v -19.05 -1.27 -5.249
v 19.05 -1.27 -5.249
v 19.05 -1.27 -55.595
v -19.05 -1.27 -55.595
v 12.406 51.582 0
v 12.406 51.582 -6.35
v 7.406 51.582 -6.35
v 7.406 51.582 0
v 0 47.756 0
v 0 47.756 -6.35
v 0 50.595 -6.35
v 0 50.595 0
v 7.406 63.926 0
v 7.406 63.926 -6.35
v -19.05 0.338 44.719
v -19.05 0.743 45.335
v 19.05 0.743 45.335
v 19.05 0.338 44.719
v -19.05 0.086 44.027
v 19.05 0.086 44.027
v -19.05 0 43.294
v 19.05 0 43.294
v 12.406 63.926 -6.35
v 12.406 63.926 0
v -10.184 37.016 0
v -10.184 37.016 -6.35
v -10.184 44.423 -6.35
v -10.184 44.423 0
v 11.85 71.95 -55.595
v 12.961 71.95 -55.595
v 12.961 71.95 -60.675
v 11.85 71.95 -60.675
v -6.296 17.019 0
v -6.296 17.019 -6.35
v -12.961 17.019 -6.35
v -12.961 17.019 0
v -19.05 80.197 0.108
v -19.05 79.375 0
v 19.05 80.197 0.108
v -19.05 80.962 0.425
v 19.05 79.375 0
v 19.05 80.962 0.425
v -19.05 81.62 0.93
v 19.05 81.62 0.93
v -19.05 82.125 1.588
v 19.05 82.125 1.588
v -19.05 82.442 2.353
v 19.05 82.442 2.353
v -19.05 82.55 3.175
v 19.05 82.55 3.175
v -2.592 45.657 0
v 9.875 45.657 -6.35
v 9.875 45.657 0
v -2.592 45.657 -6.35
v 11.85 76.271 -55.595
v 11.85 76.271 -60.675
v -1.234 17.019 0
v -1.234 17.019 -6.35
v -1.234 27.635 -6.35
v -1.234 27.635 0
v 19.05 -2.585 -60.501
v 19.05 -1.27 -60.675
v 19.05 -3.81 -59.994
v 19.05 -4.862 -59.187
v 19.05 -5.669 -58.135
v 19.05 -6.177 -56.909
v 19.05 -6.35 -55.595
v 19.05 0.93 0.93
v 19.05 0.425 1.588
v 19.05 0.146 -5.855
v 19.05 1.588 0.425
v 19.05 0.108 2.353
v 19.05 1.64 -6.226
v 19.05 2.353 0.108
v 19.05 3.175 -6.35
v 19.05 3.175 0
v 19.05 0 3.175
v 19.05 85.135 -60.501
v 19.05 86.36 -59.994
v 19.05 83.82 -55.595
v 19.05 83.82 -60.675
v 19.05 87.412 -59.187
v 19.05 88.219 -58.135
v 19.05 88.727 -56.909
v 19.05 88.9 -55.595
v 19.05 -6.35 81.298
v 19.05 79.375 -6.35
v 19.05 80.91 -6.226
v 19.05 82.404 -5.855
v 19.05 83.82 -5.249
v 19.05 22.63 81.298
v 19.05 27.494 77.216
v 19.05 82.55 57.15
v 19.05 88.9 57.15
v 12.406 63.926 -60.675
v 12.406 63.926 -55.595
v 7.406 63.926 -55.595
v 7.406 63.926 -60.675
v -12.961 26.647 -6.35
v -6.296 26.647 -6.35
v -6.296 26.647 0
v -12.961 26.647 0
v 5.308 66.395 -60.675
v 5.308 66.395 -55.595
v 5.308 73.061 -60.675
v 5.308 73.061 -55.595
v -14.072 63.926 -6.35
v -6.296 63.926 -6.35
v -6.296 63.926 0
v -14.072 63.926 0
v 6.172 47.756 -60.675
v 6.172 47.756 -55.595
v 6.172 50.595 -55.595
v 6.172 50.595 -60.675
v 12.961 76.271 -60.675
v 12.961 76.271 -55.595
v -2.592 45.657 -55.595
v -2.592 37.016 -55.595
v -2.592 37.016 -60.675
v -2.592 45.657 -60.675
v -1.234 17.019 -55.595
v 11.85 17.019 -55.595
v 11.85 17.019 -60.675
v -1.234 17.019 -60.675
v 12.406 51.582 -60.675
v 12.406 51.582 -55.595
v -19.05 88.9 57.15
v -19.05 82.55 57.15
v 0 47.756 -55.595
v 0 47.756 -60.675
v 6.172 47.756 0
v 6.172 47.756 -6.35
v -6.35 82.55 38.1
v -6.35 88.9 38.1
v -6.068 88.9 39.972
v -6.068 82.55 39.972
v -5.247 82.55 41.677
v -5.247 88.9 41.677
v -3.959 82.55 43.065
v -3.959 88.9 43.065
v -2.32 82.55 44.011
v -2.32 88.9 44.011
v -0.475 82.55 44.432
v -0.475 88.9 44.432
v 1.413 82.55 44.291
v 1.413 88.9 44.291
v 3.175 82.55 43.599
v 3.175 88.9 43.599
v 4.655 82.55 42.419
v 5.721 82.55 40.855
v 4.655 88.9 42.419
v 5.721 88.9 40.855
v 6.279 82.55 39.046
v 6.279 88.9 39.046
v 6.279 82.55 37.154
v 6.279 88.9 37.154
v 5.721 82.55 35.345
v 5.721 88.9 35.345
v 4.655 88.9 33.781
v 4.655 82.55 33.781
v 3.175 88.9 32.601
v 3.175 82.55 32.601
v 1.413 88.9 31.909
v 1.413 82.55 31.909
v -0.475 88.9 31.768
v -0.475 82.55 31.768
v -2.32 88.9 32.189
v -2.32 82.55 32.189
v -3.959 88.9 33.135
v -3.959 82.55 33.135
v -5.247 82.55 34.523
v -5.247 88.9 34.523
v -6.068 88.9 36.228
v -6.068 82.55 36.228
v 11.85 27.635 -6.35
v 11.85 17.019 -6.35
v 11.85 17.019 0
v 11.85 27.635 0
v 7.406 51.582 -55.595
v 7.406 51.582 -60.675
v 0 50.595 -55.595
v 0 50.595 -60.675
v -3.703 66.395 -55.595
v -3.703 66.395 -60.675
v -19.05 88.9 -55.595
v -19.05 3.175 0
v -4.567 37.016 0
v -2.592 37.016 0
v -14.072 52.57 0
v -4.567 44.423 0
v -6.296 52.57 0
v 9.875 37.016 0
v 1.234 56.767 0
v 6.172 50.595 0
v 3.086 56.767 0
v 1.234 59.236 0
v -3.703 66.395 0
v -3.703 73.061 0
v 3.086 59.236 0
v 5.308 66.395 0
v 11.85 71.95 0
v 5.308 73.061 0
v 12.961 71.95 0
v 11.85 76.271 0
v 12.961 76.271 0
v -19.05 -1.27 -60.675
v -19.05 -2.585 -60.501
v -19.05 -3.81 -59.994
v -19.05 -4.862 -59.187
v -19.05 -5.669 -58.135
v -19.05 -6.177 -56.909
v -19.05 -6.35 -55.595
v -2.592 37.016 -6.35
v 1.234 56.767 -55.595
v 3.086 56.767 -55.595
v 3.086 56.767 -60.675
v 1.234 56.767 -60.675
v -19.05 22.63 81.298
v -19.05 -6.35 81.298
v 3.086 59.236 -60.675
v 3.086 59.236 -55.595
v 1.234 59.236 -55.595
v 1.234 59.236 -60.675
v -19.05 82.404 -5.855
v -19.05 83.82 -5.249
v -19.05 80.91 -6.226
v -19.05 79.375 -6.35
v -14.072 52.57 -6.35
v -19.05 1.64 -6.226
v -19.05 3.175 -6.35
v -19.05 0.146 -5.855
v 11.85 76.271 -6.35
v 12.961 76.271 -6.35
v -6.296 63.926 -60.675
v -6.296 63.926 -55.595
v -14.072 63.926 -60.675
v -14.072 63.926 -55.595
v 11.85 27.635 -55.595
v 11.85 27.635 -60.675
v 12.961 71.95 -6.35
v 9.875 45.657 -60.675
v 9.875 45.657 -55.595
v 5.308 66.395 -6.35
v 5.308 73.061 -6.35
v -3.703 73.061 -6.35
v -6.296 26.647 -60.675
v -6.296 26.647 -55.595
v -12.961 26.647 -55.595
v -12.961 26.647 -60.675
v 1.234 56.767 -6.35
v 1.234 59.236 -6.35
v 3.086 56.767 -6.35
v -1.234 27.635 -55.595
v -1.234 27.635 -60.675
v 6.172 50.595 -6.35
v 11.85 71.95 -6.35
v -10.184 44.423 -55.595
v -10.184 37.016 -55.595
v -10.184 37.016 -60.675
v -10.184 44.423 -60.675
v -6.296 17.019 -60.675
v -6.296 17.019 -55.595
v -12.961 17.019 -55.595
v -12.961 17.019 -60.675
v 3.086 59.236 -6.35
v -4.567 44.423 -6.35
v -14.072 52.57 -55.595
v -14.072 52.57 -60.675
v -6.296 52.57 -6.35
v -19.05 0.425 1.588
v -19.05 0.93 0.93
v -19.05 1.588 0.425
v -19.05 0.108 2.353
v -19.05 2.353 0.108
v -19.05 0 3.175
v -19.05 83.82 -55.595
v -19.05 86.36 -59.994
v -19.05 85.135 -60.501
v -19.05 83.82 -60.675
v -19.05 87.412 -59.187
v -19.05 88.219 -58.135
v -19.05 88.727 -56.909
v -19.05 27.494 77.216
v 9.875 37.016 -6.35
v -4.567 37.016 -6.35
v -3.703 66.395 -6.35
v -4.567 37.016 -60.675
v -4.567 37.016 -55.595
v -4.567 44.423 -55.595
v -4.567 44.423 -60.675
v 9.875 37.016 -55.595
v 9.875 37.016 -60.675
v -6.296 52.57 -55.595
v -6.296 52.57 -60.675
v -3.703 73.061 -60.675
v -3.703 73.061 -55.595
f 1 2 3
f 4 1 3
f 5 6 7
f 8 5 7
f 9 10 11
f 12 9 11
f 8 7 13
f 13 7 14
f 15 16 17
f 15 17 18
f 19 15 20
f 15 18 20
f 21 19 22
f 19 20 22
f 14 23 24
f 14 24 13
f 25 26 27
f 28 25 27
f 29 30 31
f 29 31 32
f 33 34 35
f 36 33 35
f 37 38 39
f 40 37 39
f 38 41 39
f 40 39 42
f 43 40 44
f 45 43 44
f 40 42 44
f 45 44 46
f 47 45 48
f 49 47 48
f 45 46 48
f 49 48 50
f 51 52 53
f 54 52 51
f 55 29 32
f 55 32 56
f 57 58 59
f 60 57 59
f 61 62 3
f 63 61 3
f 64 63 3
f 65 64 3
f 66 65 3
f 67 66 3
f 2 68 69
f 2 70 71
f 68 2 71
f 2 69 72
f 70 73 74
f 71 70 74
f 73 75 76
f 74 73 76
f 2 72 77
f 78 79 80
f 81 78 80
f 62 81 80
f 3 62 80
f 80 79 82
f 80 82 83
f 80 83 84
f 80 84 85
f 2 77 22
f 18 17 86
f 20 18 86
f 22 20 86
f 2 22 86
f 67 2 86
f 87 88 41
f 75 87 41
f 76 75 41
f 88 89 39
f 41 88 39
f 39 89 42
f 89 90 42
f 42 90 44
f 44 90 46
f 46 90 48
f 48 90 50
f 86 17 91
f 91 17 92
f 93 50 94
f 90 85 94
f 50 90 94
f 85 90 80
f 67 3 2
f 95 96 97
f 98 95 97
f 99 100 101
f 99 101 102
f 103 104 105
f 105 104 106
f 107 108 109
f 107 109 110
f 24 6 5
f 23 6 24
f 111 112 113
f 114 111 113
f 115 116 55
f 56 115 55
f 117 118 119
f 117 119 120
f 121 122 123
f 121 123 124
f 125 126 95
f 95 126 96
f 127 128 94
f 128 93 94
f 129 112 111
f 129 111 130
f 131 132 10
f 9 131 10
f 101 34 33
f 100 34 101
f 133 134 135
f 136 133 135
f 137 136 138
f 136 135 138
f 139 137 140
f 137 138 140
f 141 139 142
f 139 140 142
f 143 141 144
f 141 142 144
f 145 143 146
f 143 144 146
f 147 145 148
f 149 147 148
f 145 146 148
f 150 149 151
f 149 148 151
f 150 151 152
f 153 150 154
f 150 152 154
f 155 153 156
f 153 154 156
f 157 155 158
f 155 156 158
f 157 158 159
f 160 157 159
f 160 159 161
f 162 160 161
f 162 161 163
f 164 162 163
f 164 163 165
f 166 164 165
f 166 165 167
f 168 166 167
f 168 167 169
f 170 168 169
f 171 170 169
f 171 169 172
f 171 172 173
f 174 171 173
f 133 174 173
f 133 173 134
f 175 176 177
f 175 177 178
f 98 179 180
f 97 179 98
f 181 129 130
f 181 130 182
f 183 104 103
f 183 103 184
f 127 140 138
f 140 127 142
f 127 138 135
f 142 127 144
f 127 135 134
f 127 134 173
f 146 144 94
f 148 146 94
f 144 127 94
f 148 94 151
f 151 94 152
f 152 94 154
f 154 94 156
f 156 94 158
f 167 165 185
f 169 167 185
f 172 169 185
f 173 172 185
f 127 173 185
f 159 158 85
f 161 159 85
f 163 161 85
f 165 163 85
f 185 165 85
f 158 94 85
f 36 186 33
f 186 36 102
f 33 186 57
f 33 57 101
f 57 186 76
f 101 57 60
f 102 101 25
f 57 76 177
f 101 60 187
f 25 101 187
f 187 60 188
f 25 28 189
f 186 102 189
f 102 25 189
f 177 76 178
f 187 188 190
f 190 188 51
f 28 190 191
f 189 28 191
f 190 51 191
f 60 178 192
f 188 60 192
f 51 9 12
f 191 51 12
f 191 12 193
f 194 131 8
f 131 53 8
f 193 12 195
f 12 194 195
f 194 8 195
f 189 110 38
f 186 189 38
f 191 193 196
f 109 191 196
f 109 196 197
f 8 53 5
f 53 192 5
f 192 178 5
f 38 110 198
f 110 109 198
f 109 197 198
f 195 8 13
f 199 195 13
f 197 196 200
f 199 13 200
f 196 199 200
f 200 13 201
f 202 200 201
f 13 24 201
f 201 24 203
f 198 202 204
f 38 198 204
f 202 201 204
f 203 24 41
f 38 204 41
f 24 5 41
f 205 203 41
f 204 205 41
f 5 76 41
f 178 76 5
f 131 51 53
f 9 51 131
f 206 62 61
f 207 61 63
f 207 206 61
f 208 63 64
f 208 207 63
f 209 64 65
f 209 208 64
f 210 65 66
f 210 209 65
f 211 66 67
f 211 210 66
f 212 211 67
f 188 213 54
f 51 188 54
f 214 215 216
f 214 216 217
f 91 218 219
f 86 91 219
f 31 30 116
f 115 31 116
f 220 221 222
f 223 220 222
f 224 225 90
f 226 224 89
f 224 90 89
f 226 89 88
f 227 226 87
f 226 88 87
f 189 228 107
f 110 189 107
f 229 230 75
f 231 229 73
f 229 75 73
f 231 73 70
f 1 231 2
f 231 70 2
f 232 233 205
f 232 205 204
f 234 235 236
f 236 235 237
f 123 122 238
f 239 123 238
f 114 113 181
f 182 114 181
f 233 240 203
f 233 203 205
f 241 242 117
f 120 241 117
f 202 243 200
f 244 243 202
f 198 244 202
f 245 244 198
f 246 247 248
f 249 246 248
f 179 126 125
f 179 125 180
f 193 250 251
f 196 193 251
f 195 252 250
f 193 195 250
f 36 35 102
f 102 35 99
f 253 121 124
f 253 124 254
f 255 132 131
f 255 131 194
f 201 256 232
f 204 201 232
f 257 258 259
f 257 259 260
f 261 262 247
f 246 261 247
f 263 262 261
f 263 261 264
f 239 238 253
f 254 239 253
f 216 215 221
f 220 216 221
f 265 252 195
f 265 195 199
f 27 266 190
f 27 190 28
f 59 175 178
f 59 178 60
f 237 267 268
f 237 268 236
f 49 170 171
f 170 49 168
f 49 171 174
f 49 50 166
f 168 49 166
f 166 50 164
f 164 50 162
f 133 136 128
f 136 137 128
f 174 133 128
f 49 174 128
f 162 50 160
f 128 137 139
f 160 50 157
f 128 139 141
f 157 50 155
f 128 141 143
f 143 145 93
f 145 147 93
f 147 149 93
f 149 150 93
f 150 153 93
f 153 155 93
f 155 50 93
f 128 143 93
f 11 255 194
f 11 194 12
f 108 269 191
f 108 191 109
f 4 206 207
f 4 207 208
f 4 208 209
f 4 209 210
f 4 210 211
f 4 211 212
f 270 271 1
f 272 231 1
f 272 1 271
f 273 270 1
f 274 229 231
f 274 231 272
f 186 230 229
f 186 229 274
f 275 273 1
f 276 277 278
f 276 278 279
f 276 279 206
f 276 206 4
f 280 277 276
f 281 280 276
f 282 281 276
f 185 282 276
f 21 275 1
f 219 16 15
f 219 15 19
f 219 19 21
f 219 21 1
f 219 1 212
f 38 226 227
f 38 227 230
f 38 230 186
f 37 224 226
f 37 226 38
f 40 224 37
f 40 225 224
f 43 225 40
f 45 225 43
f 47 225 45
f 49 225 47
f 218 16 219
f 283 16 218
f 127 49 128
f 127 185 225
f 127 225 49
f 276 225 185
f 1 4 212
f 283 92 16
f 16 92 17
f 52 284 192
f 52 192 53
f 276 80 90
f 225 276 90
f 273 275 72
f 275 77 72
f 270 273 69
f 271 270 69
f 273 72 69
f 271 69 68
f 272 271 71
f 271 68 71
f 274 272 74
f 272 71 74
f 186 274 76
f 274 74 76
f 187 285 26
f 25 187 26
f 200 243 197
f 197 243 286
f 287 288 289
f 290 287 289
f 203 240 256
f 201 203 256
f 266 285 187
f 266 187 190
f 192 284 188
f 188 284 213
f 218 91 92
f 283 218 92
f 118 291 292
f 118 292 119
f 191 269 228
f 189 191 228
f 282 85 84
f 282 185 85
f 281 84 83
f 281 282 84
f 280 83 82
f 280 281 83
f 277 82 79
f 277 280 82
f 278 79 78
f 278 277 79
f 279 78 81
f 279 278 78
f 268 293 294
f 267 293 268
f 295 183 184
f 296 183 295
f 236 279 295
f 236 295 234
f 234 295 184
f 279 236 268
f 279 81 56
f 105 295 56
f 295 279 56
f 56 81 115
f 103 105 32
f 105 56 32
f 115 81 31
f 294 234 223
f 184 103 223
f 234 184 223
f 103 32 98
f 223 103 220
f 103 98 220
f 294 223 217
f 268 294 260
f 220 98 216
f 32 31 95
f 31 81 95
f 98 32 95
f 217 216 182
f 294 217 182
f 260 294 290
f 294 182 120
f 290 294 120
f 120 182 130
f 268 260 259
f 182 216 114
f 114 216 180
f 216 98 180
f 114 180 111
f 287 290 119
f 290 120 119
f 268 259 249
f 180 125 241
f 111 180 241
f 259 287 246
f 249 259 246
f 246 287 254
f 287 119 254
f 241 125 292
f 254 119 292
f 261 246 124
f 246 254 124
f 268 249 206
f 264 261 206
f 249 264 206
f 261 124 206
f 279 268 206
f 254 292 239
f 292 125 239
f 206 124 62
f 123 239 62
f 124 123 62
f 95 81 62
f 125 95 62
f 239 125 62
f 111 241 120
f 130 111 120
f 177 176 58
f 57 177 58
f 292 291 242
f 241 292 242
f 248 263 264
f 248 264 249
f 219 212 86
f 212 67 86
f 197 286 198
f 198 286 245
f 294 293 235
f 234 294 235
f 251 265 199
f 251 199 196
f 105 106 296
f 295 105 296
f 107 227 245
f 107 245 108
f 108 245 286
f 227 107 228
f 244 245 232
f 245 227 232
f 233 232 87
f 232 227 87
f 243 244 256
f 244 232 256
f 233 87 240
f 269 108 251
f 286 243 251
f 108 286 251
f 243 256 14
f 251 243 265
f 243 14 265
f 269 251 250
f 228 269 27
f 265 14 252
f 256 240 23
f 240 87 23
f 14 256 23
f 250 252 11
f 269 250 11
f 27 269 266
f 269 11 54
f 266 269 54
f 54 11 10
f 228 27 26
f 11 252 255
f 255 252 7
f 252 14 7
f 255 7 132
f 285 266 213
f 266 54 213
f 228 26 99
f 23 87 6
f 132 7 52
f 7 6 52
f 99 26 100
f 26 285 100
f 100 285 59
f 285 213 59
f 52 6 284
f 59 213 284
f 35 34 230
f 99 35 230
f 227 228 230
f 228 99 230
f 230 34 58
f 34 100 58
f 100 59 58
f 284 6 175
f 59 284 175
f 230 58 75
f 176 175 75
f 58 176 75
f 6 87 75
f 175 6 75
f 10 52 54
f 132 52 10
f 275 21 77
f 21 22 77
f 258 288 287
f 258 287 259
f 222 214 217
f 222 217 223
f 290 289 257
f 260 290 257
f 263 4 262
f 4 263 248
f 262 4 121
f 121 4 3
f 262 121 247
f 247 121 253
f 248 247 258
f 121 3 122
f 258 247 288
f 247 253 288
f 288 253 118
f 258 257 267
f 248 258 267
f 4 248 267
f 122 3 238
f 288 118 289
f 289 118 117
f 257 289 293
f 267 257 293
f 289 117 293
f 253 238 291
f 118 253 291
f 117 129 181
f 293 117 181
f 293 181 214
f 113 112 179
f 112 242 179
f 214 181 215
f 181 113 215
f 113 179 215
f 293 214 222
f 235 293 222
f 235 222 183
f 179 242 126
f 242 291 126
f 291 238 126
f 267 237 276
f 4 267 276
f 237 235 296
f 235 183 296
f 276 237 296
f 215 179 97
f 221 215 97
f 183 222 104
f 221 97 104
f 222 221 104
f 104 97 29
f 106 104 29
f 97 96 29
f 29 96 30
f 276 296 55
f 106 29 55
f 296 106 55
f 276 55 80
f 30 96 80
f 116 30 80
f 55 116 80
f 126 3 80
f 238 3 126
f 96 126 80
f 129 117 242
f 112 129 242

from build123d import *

# Parameters (mm, degrees)
BASE_EXTRUDE_THIN_DEPTH        = 19.05
CUT_EXTRUDE1_REACH             = 97.25
SKETCH2_R                      = 6.35
BOSS_EXTRUDE1_START            = -19.05
BOSS_EXTRUDE1_DEPTH            = 38.1
EXTRUDE_THIN1_DEPTH            = 38.1
CUT_EXTRUDE2_REACH             = 89.648
SKETCH4_W                      = 1.110971389
SKETCH4_H                      = 4.320444291
SKETCH4_W_2                    = 1.851618982
SKETCH4_H_2                    = 2.46882531
SKETCH4_W_3                    = 12.467567812
SKETCH4_H_3                    = 8.640888583
SKETCH4_W_4                    = 7.776799724
SKETCH4_H_4                    = 11.356596423
SKETCH4_W_5                    = 13.08477414
SKETCH4_H_5                    = 10.61594883
SKETCH4_W_6                    = 6.665828335
SKETCH4_H_6                    = 9.628418706
SKETCH4_W_7                    = 5.616577579
SKETCH4_H_7                    = 7.406475928
SKETCH4_W_8                    = 9.011212379
SKETCH4_H_8                    = 6.665828335
SKETCH4_W_9                    = 6.172063273
SKETCH4_H_9                    = 2.839149106
SKETCH4_W_10                   = 4.999371251
SKETCH4_H_10                   = 12.344126546
CUT_EXTRUDE2_DIRECTION_2_DEPTH = 55.324508946
FILLET1_R                      = 5.08


with BuildPart() as part:
    # Sketch1 → Base-Extrude-Thin (new body, symmetric)
    with BuildSketch(Plane(origin=(0, 0, 0), x_dir=(0, 0, -1), z_dir=(1, 0, 0))):
        with BuildLine():
            Line((-77.216478592, 27.494340102), (-45.335245167, 0.742808893))
            ThreePointArc((-45.335245167, 0.742808893), (-44.380308461, 0.191475929), (-43.294394506, 0))
            Line((-43.294394506, 0), (-3.175, 0))
            ThreePointArc((-3.175, 0), (-0.92993597, 0.92993597), (0, 3.175))
            Line((0, 3.175), (0, 79.375))
            ThreePointArc((0, 79.375), (-0.92993597, 81.62006403), (-3.175, 82.55))
            Line((-3.175, 82.55), (-57.15, 82.55))
            Line((-57.15, 82.55), (-57.15, 88.9))
            Line((-57.15, 88.9), (-3.175, 88.9))
            ThreePointArc((-3.175, 88.9), (3.560192091, 86.110192091), (6.35, 79.375))
            Line((6.35, 79.375), (6.35, 3.175))
            ThreePointArc((6.35, 3.175), (3.560192091, -3.560192091), (-3.175, -6.35))
            Line((-3.175, -6.35), (-43.294394506, -6.35))
            ThreePointArc((-43.294394506, -6.35), (-46.552136371, -5.775572213), (-49.416946488, -4.121573321))
            Line((-49.416946488, -4.121573321), (-81.298179914, 22.629957888))
            Line((-81.298179914, 22.629957888), (-77.216478592, 27.494340102))
        make_face()
    extrude(amount=BASE_EXTRUDE_THIN_DEPTH, both=True)

    # Sketch2 → Cut-Extrude1 (cut, up to next)
    with BuildSketch(Plane(origin=(0, 88.9, 0), x_dir=(-1, 0, 0), z_dir=(0, 1, 0)), mode=Mode.PRIVATE) as cut_extrude1_sk1:
        with Locations((0, 38.1)):
            Circle(SKETCH2_R)
    cut_extrude1_tool1 = extrude(cut_extrude1_sk1.sketch, amount=-CUT_EXTRUDE1_REACH, mode=Mode.PRIVATE) & part.part
    add(cut_extrude1_tool1.solids().sort_by_distance((0, 88.9, 38.1))[0], mode=Mode.SUBTRACT)

    # Sketch3 → Boss-Extrude1 (add)
    with BuildSketch(Plane(origin=(0, 0, 0), x_dir=(0, 0, -1), z_dir=(1, 0, 0)).offset(BOSS_EXTRUDE1_START)):
        with BuildLine():
            Line((-49.416946488, -4.121573321), (-81.298179914, 22.629957888))
            Line((-81.298179914, 22.629957888), (-81.298179914, -6.35))
            Line((-81.298179914, -6.35), (-43.294394506, -6.35))
            ThreePointArc((-43.294394506, -6.35), (-46.552136371, -5.775572213), (-49.416946488, -4.121573321))
        make_face()
    extrude(amount=BOSS_EXTRUDE1_DEPTH)

    # Sketch5 → Extrude-Thin1 (add, through all)
    with BuildSketch(Plane(origin=(19.05, 0, 0), x_dir=(0, 0, -1), z_dir=(1, 0, 0))):
        Polygon((-3.175, 88.9), (60.674508946, 88.9), (60.674508946, -6.35), (-3.175, -6.35), (-3.175, -1.27), (55.594508946, -1.27), (55.594508946, 83.82), (-3.175, 83.82), align=None)
    extrude(amount=-EXTRUDE_THIN1_DEPTH)

    # Sketch4 → Cut-Extrude2 (cut, up to next)
    with BuildSketch(Plane(origin=(0, 0, -6.35), x_dir=(-1, 0, 0), z_dir=(0, 0, -1)), mode=Mode.PRIVATE) as cut_extrude2_sk1:
        with Locations((-12.40584718, 74.110376614)):
            Rectangle(SKETCH4_W, SKETCH4_H)
    cut_extrude2_tool1 = extrude(cut_extrude2_sk1.sketch, amount=-CUT_EXTRUDE2_REACH, mode=Mode.PRIVATE) & part.part
    add(cut_extrude2_tool1.solids().sort_by_distance((12.405847, 74.110377, -6.35))[0], mode=Mode.SUBTRACT)
    # Sketch4 → Cut-Extrude2 (cut, up to next)
    with BuildSketch(Plane(origin=(0, 0, -6.35), x_dir=(-1, 0, 0), z_dir=(0, 0, -1)), mode=Mode.PRIVATE) as cut_extrude2_sk2:
        with Locations((-2.160222146, 58.001291471)):
            Rectangle(SKETCH4_W_2, SKETCH4_H_2)
    cut_extrude2_tool2 = extrude(cut_extrude2_sk2.sketch, amount=-CUT_EXTRUDE2_REACH, mode=Mode.PRIVATE) & part.part
    add(cut_extrude2_tool2.solids().sort_by_distance((2.160222, 58.001291, -6.35))[0], mode=Mode.SUBTRACT)
    # Sketch4 → Cut-Extrude2 (cut, up to next)
    with BuildSketch(Plane(origin=(0, 0, -6.35), x_dir=(-1, 0, 0), z_dir=(0, 0, -1)), mode=Mode.PRIVATE) as cut_extrude2_sk3:
        with Locations((-3.641517331, 41.336720633)):
            Rectangle(SKETCH4_W_3, SKETCH4_H_3)
    cut_extrude2_tool3 = extrude(cut_extrude2_sk3.sketch, amount=-CUT_EXTRUDE2_REACH, mode=Mode.PRIVATE) & part.part
    add(cut_extrude2_tool3.solids().sort_by_distance((3.641517, 41.336721, -6.35))[0], mode=Mode.SUBTRACT)
    # Sketch4 → Cut-Extrude2 (cut, up to next)
    with BuildSketch(Plane(origin=(0, 0, -6.35), x_dir=(-1, 0, 0), z_dir=(0, 0, -1)), mode=Mode.PRIVATE) as cut_extrude2_sk4:
        with Locations((10.183904401, 58.248174002)):
            Rectangle(SKETCH4_W_4, SKETCH4_H_4)
    cut_extrude2_tool4 = extrude(cut_extrude2_sk4.sketch, amount=-CUT_EXTRUDE2_REACH, mode=Mode.PRIVATE) & part.part
    add(cut_extrude2_tool4.solids().sort_by_distance((-10.183904, 58.248174, -6.35))[0], mode=Mode.SUBTRACT)
    # Sketch4 → Cut-Extrude2 (cut, up to next)
    with BuildSketch(Plane(origin=(0, 0, -6.35), x_dir=(-1, 0, 0), z_dir=(0, 0, -1)), mode=Mode.PRIVATE) as cut_extrude2_sk5:
        with Locations((-5.307974415, 22.326765751)):
            Rectangle(SKETCH4_W_5, SKETCH4_H_5)
    cut_extrude2_tool5 = extrude(cut_extrude2_sk5.sketch, amount=-CUT_EXTRUDE2_REACH, mode=Mode.PRIVATE) & part.part
    add(cut_extrude2_tool5.solids().sort_by_distance((5.307974, 22.326766, -6.35))[0], mode=Mode.SUBTRACT)
    # Sketch4 → Cut-Extrude2 (cut, up to next)
    with BuildSketch(Plane(origin=(0, 0, -6.35), x_dir=(-1, 0, 0), z_dir=(0, 0, -1)), mode=Mode.PRIVATE) as cut_extrude2_sk6:
        with Locations((9.628418706, 21.833000689)):
            Rectangle(SKETCH4_W_6, SKETCH4_H_6)
    cut_extrude2_tool6 = extrude(cut_extrude2_sk6.sketch, amount=-CUT_EXTRUDE2_REACH, mode=Mode.PRIVATE) & part.part
    add(cut_extrude2_tool6.solids().sort_by_distance((-9.628419, 21.833001, -6.35))[0], mode=Mode.SUBTRACT)
    # Sketch4 → Cut-Extrude2 (cut, up to next)
    with BuildSketch(Plane(origin=(0, 0, -6.35), x_dir=(-1, 0, 0), z_dir=(0, 0, -1)), mode=Mode.PRIVATE) as cut_extrude2_sk7:
        with Locations((7.375615612, 40.719514305)):
            Rectangle(SKETCH4_W_7, SKETCH4_H_7)
    cut_extrude2_tool7 = extrude(cut_extrude2_sk7.sketch, amount=-CUT_EXTRUDE2_REACH, mode=Mode.PRIVATE) & part.part
    add(cut_extrude2_tool7.solids().sort_by_distance((-7.375616, 40.719514, -6.35))[0], mode=Mode.SUBTRACT)
    # Sketch4 → Cut-Extrude2 (cut, up to next)
    with BuildSketch(Plane(origin=(0, 0, -6.35), x_dir=(-1, 0, 0), z_dir=(0, 0, -1)), mode=Mode.PRIVATE) as cut_extrude2_sk8:
        with Locations((-0.802368225, 69.728211691)):
            Rectangle(SKETCH4_W_8, SKETCH4_H_8)
    cut_extrude2_tool8 = extrude(cut_extrude2_sk8.sketch, amount=-CUT_EXTRUDE2_REACH, mode=Mode.PRIVATE) & part.part
    add(cut_extrude2_tool8.solids().sort_by_distance((0.802368, 69.728212, -6.35))[0], mode=Mode.SUBTRACT)
    # Sketch4 → Cut-Extrude2 (cut, up to next)
    with BuildSketch(Plane(origin=(0, 0, -6.35), x_dir=(-1, 0, 0), z_dir=(0, 0, -1)), mode=Mode.PRIVATE) as cut_extrude2_sk9:
        with Locations((-3.086031637, 49.17524099)):
            Rectangle(SKETCH4_W_9, SKETCH4_H_9)
    cut_extrude2_tool9 = extrude(cut_extrude2_sk9.sketch, amount=-CUT_EXTRUDE2_REACH, mode=Mode.PRIVATE) & part.part
    add(cut_extrude2_tool9.solids().sort_by_distance((3.086032, 49.175241, -6.35))[0], mode=Mode.SUBTRACT)
    # Sketch4 → Cut-Extrude2 (cut, up to next)
    with BuildSketch(Plane(origin=(0, 0, -6.35), x_dir=(-1, 0, 0), z_dir=(0, 0, -1)), mode=Mode.PRIVATE) as cut_extrude2_sk10:
        with Locations((-9.906161554, 57.75440894)):
            Rectangle(SKETCH4_W_10, SKETCH4_H_10)
    cut_extrude2_tool10 = extrude(cut_extrude2_sk10.sketch, amount=-CUT_EXTRUDE2_REACH, mode=Mode.PRIVATE) & part.part
    add(cut_extrude2_tool10.solids().sort_by_distance((9.906162, 57.754409, -6.35))[0], mode=Mode.SUBTRACT)

    # Sketch4 → Cut-Extrude2 direction 2 (cut)
    with BuildSketch(Plane(origin=(0, 0, -6.35), x_dir=(-1, 0, 0), z_dir=(0, 0, -1))):
        with Locations((-12.40584718, 74.110376614)):
            Rectangle(SKETCH4_W, SKETCH4_H)
        with Locations((-2.160222146, 58.001291471)):
            Rectangle(SKETCH4_W_2, SKETCH4_H_2)
        with Locations((-3.641517331, 41.336720633)):
            Rectangle(SKETCH4_W_3, SKETCH4_H_3)
        with Locations((10.183904401, 58.248174002)):
            Rectangle(SKETCH4_W_4, SKETCH4_H_4)
        with Locations((-5.307974415, 22.326765751)):
            Rectangle(SKETCH4_W_5, SKETCH4_H_5)
        with Locations((9.628418706, 21.833000689)):
            Rectangle(SKETCH4_W_6, SKETCH4_H_6)
        with Locations((7.375615612, 40.719514305)):
            Rectangle(SKETCH4_W_7, SKETCH4_H_7)
        with Locations((-0.802368225, 69.728211691)):
            Rectangle(SKETCH4_W_8, SKETCH4_H_8)
        with Locations((-3.086031637, 49.17524099)):
            Rectangle(SKETCH4_W_9, SKETCH4_H_9)
        with Locations((-9.906161554, 57.75440894)):
            Rectangle(SKETCH4_W_10, SKETCH4_H_10)
    extrude(amount=CUT_EXTRUDE2_DIRECTION_2_DEPTH, mode=Mode.SUBTRACT)

    # Fillet1
    fillet1_edges = [part.edges().sort_by_distance(p)[0] for p in [
        (0, 88.9, -60.674508946),
        (0, -6.35, -60.674508946),
    ]]
    fillet(fillet1_edges, radius=FILLET1_R)


solid = part.part
